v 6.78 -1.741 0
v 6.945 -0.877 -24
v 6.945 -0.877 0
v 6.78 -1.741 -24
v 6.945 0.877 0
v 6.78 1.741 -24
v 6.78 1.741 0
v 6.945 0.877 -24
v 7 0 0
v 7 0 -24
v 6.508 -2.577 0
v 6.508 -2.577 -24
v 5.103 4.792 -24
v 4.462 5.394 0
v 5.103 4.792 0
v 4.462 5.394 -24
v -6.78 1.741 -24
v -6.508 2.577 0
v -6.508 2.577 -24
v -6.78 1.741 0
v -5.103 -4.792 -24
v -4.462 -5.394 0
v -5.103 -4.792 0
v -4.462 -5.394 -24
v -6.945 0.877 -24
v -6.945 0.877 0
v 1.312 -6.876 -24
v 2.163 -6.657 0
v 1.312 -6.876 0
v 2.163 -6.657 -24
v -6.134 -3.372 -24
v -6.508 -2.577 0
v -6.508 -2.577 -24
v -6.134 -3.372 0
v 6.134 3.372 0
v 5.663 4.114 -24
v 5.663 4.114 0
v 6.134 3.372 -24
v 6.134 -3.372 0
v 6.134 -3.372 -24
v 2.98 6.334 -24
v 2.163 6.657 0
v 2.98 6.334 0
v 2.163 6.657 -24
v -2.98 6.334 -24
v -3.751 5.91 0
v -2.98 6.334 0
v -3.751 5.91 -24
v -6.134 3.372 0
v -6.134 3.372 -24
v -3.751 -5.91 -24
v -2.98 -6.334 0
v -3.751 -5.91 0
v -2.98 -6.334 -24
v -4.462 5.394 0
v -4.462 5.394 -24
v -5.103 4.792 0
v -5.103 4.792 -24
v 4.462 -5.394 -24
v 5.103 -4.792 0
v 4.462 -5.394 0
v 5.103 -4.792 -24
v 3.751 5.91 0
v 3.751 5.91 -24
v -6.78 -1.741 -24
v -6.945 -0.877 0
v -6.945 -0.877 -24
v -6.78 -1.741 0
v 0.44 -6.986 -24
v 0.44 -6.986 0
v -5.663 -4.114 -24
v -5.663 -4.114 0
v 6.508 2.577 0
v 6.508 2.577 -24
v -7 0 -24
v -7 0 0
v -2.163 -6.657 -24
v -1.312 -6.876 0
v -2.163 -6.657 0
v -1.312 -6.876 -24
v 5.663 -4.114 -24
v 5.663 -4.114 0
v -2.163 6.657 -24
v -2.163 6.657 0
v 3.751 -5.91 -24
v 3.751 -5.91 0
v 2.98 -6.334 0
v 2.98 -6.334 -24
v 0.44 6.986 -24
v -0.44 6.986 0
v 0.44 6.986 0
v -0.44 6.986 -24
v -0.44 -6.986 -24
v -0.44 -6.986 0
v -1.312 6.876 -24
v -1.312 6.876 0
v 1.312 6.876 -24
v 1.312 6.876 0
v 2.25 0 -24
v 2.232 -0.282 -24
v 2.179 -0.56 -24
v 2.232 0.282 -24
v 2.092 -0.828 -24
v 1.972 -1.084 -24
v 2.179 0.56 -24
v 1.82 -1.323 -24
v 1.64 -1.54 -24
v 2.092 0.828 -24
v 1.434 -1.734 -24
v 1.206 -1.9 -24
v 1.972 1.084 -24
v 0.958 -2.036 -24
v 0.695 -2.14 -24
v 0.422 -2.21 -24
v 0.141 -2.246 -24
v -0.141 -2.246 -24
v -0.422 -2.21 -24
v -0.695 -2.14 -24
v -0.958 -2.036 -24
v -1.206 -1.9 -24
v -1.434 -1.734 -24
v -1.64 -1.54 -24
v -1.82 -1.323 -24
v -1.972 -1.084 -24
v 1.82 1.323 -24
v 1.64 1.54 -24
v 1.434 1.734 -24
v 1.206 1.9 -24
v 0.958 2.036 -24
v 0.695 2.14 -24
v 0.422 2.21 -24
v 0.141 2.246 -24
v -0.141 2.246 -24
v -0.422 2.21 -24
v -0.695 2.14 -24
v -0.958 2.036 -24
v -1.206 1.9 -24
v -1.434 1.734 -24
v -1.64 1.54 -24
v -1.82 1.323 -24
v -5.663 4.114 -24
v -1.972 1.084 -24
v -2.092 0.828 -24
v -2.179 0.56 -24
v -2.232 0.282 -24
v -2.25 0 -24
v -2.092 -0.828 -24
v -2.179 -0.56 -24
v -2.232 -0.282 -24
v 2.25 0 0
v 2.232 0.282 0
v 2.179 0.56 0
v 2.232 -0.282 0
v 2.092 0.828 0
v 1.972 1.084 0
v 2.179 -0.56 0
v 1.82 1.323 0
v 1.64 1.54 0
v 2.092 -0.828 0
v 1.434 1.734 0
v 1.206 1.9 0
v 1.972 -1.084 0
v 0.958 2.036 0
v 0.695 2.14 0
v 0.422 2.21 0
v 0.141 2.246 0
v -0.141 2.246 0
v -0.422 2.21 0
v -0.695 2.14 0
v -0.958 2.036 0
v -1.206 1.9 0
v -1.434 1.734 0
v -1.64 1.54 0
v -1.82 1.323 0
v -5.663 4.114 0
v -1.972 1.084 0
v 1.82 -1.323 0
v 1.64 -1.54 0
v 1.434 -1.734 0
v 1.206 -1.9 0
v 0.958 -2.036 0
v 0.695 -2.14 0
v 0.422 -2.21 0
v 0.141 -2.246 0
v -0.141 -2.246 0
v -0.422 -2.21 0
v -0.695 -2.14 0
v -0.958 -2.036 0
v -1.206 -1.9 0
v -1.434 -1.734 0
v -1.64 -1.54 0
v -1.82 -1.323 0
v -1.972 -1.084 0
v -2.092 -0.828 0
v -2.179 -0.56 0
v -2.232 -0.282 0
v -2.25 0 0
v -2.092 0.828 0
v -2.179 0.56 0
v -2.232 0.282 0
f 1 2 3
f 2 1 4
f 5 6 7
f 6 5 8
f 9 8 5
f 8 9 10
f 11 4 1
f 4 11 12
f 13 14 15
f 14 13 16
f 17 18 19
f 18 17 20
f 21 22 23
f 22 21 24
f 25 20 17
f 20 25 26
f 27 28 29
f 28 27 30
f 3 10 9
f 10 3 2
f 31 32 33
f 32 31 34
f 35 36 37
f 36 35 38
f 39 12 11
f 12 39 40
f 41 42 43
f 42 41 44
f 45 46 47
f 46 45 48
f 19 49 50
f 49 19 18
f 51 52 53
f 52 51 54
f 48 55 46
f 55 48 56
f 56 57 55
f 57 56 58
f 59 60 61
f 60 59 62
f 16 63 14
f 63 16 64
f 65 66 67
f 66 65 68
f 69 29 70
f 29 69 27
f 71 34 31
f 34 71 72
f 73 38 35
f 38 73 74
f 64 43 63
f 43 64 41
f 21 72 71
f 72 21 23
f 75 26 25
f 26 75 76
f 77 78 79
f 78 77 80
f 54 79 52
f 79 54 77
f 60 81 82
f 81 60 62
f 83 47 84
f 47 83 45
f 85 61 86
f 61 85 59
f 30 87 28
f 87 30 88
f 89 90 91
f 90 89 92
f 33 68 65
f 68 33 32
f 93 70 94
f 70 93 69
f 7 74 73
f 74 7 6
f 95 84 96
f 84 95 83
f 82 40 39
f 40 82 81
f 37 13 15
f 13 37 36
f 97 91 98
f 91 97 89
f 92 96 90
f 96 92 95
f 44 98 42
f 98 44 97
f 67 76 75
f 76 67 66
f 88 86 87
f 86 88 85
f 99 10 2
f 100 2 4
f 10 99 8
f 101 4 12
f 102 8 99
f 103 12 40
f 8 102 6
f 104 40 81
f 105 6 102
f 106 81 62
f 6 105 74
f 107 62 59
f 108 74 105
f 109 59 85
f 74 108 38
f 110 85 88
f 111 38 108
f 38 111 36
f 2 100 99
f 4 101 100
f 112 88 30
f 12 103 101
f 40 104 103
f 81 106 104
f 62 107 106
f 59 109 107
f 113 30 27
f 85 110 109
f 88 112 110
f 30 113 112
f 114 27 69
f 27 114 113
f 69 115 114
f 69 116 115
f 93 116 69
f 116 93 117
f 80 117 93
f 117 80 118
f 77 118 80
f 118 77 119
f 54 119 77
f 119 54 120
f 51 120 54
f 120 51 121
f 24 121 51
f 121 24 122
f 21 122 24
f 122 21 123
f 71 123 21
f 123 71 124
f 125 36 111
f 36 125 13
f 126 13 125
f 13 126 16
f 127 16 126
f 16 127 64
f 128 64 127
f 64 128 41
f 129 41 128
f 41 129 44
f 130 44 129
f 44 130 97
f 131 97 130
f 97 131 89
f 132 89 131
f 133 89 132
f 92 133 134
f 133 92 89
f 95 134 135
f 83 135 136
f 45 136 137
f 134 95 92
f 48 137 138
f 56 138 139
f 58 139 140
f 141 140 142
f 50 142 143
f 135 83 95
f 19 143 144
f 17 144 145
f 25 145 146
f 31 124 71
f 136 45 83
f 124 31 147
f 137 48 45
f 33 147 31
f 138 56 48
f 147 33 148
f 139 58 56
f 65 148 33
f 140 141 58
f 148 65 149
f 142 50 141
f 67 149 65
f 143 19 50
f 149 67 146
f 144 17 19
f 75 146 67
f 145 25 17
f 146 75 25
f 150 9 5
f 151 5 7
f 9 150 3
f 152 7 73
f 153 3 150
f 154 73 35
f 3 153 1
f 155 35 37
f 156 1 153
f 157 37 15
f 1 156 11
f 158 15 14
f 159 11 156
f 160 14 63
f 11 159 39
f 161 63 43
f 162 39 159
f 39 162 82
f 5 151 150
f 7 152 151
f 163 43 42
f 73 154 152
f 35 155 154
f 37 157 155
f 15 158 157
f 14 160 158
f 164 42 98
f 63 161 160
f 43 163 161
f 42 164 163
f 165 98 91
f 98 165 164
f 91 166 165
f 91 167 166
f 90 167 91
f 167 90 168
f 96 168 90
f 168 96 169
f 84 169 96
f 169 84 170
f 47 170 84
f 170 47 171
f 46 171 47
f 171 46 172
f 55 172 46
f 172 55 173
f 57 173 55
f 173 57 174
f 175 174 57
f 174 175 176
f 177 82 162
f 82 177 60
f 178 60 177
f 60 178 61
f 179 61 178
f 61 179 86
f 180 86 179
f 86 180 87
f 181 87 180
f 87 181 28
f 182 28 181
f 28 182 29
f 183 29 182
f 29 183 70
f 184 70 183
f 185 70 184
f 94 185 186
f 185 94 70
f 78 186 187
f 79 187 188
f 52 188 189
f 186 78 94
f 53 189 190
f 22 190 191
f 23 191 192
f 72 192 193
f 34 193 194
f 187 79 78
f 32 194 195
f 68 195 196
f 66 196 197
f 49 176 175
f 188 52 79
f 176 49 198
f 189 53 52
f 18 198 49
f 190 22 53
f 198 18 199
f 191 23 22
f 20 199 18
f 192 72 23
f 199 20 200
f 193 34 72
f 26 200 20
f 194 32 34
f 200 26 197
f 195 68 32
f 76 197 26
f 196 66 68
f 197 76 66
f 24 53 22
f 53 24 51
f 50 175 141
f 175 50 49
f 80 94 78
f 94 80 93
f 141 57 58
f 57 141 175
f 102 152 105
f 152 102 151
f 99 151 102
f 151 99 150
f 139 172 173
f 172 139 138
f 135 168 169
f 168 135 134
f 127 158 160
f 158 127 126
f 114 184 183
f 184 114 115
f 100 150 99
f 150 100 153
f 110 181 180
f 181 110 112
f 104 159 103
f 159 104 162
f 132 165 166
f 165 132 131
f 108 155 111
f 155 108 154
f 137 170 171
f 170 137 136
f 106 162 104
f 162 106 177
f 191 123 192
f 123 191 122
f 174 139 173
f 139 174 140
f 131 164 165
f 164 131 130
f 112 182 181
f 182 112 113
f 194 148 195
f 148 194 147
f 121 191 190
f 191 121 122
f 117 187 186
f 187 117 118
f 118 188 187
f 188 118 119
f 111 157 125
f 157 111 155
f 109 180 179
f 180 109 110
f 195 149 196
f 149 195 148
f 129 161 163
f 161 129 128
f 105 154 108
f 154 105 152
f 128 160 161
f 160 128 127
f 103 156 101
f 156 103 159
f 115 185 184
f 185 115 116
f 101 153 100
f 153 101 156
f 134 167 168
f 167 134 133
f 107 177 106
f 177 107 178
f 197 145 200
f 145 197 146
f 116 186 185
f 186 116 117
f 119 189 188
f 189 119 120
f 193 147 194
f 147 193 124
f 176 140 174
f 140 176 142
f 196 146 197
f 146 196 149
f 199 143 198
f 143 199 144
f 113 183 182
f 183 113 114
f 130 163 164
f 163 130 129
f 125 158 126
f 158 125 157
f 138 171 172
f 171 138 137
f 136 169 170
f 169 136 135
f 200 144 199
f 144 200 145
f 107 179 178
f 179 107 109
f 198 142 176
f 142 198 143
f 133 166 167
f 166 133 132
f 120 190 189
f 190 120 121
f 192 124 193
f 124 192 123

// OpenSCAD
$fn = 50;


difference() {
	union() {
		translate(v = [0, 0, -24.0000000000]) {
			cylinder(h = 24, r = 7.0000000000);
		}
		cylinder(h = 0, r = 10.0000000000);
	}
	union() {
		#translate(v = [0, 0, -24]) {
			cylinder(h = 24, r = 2.2500000000);
		}
	}
}
